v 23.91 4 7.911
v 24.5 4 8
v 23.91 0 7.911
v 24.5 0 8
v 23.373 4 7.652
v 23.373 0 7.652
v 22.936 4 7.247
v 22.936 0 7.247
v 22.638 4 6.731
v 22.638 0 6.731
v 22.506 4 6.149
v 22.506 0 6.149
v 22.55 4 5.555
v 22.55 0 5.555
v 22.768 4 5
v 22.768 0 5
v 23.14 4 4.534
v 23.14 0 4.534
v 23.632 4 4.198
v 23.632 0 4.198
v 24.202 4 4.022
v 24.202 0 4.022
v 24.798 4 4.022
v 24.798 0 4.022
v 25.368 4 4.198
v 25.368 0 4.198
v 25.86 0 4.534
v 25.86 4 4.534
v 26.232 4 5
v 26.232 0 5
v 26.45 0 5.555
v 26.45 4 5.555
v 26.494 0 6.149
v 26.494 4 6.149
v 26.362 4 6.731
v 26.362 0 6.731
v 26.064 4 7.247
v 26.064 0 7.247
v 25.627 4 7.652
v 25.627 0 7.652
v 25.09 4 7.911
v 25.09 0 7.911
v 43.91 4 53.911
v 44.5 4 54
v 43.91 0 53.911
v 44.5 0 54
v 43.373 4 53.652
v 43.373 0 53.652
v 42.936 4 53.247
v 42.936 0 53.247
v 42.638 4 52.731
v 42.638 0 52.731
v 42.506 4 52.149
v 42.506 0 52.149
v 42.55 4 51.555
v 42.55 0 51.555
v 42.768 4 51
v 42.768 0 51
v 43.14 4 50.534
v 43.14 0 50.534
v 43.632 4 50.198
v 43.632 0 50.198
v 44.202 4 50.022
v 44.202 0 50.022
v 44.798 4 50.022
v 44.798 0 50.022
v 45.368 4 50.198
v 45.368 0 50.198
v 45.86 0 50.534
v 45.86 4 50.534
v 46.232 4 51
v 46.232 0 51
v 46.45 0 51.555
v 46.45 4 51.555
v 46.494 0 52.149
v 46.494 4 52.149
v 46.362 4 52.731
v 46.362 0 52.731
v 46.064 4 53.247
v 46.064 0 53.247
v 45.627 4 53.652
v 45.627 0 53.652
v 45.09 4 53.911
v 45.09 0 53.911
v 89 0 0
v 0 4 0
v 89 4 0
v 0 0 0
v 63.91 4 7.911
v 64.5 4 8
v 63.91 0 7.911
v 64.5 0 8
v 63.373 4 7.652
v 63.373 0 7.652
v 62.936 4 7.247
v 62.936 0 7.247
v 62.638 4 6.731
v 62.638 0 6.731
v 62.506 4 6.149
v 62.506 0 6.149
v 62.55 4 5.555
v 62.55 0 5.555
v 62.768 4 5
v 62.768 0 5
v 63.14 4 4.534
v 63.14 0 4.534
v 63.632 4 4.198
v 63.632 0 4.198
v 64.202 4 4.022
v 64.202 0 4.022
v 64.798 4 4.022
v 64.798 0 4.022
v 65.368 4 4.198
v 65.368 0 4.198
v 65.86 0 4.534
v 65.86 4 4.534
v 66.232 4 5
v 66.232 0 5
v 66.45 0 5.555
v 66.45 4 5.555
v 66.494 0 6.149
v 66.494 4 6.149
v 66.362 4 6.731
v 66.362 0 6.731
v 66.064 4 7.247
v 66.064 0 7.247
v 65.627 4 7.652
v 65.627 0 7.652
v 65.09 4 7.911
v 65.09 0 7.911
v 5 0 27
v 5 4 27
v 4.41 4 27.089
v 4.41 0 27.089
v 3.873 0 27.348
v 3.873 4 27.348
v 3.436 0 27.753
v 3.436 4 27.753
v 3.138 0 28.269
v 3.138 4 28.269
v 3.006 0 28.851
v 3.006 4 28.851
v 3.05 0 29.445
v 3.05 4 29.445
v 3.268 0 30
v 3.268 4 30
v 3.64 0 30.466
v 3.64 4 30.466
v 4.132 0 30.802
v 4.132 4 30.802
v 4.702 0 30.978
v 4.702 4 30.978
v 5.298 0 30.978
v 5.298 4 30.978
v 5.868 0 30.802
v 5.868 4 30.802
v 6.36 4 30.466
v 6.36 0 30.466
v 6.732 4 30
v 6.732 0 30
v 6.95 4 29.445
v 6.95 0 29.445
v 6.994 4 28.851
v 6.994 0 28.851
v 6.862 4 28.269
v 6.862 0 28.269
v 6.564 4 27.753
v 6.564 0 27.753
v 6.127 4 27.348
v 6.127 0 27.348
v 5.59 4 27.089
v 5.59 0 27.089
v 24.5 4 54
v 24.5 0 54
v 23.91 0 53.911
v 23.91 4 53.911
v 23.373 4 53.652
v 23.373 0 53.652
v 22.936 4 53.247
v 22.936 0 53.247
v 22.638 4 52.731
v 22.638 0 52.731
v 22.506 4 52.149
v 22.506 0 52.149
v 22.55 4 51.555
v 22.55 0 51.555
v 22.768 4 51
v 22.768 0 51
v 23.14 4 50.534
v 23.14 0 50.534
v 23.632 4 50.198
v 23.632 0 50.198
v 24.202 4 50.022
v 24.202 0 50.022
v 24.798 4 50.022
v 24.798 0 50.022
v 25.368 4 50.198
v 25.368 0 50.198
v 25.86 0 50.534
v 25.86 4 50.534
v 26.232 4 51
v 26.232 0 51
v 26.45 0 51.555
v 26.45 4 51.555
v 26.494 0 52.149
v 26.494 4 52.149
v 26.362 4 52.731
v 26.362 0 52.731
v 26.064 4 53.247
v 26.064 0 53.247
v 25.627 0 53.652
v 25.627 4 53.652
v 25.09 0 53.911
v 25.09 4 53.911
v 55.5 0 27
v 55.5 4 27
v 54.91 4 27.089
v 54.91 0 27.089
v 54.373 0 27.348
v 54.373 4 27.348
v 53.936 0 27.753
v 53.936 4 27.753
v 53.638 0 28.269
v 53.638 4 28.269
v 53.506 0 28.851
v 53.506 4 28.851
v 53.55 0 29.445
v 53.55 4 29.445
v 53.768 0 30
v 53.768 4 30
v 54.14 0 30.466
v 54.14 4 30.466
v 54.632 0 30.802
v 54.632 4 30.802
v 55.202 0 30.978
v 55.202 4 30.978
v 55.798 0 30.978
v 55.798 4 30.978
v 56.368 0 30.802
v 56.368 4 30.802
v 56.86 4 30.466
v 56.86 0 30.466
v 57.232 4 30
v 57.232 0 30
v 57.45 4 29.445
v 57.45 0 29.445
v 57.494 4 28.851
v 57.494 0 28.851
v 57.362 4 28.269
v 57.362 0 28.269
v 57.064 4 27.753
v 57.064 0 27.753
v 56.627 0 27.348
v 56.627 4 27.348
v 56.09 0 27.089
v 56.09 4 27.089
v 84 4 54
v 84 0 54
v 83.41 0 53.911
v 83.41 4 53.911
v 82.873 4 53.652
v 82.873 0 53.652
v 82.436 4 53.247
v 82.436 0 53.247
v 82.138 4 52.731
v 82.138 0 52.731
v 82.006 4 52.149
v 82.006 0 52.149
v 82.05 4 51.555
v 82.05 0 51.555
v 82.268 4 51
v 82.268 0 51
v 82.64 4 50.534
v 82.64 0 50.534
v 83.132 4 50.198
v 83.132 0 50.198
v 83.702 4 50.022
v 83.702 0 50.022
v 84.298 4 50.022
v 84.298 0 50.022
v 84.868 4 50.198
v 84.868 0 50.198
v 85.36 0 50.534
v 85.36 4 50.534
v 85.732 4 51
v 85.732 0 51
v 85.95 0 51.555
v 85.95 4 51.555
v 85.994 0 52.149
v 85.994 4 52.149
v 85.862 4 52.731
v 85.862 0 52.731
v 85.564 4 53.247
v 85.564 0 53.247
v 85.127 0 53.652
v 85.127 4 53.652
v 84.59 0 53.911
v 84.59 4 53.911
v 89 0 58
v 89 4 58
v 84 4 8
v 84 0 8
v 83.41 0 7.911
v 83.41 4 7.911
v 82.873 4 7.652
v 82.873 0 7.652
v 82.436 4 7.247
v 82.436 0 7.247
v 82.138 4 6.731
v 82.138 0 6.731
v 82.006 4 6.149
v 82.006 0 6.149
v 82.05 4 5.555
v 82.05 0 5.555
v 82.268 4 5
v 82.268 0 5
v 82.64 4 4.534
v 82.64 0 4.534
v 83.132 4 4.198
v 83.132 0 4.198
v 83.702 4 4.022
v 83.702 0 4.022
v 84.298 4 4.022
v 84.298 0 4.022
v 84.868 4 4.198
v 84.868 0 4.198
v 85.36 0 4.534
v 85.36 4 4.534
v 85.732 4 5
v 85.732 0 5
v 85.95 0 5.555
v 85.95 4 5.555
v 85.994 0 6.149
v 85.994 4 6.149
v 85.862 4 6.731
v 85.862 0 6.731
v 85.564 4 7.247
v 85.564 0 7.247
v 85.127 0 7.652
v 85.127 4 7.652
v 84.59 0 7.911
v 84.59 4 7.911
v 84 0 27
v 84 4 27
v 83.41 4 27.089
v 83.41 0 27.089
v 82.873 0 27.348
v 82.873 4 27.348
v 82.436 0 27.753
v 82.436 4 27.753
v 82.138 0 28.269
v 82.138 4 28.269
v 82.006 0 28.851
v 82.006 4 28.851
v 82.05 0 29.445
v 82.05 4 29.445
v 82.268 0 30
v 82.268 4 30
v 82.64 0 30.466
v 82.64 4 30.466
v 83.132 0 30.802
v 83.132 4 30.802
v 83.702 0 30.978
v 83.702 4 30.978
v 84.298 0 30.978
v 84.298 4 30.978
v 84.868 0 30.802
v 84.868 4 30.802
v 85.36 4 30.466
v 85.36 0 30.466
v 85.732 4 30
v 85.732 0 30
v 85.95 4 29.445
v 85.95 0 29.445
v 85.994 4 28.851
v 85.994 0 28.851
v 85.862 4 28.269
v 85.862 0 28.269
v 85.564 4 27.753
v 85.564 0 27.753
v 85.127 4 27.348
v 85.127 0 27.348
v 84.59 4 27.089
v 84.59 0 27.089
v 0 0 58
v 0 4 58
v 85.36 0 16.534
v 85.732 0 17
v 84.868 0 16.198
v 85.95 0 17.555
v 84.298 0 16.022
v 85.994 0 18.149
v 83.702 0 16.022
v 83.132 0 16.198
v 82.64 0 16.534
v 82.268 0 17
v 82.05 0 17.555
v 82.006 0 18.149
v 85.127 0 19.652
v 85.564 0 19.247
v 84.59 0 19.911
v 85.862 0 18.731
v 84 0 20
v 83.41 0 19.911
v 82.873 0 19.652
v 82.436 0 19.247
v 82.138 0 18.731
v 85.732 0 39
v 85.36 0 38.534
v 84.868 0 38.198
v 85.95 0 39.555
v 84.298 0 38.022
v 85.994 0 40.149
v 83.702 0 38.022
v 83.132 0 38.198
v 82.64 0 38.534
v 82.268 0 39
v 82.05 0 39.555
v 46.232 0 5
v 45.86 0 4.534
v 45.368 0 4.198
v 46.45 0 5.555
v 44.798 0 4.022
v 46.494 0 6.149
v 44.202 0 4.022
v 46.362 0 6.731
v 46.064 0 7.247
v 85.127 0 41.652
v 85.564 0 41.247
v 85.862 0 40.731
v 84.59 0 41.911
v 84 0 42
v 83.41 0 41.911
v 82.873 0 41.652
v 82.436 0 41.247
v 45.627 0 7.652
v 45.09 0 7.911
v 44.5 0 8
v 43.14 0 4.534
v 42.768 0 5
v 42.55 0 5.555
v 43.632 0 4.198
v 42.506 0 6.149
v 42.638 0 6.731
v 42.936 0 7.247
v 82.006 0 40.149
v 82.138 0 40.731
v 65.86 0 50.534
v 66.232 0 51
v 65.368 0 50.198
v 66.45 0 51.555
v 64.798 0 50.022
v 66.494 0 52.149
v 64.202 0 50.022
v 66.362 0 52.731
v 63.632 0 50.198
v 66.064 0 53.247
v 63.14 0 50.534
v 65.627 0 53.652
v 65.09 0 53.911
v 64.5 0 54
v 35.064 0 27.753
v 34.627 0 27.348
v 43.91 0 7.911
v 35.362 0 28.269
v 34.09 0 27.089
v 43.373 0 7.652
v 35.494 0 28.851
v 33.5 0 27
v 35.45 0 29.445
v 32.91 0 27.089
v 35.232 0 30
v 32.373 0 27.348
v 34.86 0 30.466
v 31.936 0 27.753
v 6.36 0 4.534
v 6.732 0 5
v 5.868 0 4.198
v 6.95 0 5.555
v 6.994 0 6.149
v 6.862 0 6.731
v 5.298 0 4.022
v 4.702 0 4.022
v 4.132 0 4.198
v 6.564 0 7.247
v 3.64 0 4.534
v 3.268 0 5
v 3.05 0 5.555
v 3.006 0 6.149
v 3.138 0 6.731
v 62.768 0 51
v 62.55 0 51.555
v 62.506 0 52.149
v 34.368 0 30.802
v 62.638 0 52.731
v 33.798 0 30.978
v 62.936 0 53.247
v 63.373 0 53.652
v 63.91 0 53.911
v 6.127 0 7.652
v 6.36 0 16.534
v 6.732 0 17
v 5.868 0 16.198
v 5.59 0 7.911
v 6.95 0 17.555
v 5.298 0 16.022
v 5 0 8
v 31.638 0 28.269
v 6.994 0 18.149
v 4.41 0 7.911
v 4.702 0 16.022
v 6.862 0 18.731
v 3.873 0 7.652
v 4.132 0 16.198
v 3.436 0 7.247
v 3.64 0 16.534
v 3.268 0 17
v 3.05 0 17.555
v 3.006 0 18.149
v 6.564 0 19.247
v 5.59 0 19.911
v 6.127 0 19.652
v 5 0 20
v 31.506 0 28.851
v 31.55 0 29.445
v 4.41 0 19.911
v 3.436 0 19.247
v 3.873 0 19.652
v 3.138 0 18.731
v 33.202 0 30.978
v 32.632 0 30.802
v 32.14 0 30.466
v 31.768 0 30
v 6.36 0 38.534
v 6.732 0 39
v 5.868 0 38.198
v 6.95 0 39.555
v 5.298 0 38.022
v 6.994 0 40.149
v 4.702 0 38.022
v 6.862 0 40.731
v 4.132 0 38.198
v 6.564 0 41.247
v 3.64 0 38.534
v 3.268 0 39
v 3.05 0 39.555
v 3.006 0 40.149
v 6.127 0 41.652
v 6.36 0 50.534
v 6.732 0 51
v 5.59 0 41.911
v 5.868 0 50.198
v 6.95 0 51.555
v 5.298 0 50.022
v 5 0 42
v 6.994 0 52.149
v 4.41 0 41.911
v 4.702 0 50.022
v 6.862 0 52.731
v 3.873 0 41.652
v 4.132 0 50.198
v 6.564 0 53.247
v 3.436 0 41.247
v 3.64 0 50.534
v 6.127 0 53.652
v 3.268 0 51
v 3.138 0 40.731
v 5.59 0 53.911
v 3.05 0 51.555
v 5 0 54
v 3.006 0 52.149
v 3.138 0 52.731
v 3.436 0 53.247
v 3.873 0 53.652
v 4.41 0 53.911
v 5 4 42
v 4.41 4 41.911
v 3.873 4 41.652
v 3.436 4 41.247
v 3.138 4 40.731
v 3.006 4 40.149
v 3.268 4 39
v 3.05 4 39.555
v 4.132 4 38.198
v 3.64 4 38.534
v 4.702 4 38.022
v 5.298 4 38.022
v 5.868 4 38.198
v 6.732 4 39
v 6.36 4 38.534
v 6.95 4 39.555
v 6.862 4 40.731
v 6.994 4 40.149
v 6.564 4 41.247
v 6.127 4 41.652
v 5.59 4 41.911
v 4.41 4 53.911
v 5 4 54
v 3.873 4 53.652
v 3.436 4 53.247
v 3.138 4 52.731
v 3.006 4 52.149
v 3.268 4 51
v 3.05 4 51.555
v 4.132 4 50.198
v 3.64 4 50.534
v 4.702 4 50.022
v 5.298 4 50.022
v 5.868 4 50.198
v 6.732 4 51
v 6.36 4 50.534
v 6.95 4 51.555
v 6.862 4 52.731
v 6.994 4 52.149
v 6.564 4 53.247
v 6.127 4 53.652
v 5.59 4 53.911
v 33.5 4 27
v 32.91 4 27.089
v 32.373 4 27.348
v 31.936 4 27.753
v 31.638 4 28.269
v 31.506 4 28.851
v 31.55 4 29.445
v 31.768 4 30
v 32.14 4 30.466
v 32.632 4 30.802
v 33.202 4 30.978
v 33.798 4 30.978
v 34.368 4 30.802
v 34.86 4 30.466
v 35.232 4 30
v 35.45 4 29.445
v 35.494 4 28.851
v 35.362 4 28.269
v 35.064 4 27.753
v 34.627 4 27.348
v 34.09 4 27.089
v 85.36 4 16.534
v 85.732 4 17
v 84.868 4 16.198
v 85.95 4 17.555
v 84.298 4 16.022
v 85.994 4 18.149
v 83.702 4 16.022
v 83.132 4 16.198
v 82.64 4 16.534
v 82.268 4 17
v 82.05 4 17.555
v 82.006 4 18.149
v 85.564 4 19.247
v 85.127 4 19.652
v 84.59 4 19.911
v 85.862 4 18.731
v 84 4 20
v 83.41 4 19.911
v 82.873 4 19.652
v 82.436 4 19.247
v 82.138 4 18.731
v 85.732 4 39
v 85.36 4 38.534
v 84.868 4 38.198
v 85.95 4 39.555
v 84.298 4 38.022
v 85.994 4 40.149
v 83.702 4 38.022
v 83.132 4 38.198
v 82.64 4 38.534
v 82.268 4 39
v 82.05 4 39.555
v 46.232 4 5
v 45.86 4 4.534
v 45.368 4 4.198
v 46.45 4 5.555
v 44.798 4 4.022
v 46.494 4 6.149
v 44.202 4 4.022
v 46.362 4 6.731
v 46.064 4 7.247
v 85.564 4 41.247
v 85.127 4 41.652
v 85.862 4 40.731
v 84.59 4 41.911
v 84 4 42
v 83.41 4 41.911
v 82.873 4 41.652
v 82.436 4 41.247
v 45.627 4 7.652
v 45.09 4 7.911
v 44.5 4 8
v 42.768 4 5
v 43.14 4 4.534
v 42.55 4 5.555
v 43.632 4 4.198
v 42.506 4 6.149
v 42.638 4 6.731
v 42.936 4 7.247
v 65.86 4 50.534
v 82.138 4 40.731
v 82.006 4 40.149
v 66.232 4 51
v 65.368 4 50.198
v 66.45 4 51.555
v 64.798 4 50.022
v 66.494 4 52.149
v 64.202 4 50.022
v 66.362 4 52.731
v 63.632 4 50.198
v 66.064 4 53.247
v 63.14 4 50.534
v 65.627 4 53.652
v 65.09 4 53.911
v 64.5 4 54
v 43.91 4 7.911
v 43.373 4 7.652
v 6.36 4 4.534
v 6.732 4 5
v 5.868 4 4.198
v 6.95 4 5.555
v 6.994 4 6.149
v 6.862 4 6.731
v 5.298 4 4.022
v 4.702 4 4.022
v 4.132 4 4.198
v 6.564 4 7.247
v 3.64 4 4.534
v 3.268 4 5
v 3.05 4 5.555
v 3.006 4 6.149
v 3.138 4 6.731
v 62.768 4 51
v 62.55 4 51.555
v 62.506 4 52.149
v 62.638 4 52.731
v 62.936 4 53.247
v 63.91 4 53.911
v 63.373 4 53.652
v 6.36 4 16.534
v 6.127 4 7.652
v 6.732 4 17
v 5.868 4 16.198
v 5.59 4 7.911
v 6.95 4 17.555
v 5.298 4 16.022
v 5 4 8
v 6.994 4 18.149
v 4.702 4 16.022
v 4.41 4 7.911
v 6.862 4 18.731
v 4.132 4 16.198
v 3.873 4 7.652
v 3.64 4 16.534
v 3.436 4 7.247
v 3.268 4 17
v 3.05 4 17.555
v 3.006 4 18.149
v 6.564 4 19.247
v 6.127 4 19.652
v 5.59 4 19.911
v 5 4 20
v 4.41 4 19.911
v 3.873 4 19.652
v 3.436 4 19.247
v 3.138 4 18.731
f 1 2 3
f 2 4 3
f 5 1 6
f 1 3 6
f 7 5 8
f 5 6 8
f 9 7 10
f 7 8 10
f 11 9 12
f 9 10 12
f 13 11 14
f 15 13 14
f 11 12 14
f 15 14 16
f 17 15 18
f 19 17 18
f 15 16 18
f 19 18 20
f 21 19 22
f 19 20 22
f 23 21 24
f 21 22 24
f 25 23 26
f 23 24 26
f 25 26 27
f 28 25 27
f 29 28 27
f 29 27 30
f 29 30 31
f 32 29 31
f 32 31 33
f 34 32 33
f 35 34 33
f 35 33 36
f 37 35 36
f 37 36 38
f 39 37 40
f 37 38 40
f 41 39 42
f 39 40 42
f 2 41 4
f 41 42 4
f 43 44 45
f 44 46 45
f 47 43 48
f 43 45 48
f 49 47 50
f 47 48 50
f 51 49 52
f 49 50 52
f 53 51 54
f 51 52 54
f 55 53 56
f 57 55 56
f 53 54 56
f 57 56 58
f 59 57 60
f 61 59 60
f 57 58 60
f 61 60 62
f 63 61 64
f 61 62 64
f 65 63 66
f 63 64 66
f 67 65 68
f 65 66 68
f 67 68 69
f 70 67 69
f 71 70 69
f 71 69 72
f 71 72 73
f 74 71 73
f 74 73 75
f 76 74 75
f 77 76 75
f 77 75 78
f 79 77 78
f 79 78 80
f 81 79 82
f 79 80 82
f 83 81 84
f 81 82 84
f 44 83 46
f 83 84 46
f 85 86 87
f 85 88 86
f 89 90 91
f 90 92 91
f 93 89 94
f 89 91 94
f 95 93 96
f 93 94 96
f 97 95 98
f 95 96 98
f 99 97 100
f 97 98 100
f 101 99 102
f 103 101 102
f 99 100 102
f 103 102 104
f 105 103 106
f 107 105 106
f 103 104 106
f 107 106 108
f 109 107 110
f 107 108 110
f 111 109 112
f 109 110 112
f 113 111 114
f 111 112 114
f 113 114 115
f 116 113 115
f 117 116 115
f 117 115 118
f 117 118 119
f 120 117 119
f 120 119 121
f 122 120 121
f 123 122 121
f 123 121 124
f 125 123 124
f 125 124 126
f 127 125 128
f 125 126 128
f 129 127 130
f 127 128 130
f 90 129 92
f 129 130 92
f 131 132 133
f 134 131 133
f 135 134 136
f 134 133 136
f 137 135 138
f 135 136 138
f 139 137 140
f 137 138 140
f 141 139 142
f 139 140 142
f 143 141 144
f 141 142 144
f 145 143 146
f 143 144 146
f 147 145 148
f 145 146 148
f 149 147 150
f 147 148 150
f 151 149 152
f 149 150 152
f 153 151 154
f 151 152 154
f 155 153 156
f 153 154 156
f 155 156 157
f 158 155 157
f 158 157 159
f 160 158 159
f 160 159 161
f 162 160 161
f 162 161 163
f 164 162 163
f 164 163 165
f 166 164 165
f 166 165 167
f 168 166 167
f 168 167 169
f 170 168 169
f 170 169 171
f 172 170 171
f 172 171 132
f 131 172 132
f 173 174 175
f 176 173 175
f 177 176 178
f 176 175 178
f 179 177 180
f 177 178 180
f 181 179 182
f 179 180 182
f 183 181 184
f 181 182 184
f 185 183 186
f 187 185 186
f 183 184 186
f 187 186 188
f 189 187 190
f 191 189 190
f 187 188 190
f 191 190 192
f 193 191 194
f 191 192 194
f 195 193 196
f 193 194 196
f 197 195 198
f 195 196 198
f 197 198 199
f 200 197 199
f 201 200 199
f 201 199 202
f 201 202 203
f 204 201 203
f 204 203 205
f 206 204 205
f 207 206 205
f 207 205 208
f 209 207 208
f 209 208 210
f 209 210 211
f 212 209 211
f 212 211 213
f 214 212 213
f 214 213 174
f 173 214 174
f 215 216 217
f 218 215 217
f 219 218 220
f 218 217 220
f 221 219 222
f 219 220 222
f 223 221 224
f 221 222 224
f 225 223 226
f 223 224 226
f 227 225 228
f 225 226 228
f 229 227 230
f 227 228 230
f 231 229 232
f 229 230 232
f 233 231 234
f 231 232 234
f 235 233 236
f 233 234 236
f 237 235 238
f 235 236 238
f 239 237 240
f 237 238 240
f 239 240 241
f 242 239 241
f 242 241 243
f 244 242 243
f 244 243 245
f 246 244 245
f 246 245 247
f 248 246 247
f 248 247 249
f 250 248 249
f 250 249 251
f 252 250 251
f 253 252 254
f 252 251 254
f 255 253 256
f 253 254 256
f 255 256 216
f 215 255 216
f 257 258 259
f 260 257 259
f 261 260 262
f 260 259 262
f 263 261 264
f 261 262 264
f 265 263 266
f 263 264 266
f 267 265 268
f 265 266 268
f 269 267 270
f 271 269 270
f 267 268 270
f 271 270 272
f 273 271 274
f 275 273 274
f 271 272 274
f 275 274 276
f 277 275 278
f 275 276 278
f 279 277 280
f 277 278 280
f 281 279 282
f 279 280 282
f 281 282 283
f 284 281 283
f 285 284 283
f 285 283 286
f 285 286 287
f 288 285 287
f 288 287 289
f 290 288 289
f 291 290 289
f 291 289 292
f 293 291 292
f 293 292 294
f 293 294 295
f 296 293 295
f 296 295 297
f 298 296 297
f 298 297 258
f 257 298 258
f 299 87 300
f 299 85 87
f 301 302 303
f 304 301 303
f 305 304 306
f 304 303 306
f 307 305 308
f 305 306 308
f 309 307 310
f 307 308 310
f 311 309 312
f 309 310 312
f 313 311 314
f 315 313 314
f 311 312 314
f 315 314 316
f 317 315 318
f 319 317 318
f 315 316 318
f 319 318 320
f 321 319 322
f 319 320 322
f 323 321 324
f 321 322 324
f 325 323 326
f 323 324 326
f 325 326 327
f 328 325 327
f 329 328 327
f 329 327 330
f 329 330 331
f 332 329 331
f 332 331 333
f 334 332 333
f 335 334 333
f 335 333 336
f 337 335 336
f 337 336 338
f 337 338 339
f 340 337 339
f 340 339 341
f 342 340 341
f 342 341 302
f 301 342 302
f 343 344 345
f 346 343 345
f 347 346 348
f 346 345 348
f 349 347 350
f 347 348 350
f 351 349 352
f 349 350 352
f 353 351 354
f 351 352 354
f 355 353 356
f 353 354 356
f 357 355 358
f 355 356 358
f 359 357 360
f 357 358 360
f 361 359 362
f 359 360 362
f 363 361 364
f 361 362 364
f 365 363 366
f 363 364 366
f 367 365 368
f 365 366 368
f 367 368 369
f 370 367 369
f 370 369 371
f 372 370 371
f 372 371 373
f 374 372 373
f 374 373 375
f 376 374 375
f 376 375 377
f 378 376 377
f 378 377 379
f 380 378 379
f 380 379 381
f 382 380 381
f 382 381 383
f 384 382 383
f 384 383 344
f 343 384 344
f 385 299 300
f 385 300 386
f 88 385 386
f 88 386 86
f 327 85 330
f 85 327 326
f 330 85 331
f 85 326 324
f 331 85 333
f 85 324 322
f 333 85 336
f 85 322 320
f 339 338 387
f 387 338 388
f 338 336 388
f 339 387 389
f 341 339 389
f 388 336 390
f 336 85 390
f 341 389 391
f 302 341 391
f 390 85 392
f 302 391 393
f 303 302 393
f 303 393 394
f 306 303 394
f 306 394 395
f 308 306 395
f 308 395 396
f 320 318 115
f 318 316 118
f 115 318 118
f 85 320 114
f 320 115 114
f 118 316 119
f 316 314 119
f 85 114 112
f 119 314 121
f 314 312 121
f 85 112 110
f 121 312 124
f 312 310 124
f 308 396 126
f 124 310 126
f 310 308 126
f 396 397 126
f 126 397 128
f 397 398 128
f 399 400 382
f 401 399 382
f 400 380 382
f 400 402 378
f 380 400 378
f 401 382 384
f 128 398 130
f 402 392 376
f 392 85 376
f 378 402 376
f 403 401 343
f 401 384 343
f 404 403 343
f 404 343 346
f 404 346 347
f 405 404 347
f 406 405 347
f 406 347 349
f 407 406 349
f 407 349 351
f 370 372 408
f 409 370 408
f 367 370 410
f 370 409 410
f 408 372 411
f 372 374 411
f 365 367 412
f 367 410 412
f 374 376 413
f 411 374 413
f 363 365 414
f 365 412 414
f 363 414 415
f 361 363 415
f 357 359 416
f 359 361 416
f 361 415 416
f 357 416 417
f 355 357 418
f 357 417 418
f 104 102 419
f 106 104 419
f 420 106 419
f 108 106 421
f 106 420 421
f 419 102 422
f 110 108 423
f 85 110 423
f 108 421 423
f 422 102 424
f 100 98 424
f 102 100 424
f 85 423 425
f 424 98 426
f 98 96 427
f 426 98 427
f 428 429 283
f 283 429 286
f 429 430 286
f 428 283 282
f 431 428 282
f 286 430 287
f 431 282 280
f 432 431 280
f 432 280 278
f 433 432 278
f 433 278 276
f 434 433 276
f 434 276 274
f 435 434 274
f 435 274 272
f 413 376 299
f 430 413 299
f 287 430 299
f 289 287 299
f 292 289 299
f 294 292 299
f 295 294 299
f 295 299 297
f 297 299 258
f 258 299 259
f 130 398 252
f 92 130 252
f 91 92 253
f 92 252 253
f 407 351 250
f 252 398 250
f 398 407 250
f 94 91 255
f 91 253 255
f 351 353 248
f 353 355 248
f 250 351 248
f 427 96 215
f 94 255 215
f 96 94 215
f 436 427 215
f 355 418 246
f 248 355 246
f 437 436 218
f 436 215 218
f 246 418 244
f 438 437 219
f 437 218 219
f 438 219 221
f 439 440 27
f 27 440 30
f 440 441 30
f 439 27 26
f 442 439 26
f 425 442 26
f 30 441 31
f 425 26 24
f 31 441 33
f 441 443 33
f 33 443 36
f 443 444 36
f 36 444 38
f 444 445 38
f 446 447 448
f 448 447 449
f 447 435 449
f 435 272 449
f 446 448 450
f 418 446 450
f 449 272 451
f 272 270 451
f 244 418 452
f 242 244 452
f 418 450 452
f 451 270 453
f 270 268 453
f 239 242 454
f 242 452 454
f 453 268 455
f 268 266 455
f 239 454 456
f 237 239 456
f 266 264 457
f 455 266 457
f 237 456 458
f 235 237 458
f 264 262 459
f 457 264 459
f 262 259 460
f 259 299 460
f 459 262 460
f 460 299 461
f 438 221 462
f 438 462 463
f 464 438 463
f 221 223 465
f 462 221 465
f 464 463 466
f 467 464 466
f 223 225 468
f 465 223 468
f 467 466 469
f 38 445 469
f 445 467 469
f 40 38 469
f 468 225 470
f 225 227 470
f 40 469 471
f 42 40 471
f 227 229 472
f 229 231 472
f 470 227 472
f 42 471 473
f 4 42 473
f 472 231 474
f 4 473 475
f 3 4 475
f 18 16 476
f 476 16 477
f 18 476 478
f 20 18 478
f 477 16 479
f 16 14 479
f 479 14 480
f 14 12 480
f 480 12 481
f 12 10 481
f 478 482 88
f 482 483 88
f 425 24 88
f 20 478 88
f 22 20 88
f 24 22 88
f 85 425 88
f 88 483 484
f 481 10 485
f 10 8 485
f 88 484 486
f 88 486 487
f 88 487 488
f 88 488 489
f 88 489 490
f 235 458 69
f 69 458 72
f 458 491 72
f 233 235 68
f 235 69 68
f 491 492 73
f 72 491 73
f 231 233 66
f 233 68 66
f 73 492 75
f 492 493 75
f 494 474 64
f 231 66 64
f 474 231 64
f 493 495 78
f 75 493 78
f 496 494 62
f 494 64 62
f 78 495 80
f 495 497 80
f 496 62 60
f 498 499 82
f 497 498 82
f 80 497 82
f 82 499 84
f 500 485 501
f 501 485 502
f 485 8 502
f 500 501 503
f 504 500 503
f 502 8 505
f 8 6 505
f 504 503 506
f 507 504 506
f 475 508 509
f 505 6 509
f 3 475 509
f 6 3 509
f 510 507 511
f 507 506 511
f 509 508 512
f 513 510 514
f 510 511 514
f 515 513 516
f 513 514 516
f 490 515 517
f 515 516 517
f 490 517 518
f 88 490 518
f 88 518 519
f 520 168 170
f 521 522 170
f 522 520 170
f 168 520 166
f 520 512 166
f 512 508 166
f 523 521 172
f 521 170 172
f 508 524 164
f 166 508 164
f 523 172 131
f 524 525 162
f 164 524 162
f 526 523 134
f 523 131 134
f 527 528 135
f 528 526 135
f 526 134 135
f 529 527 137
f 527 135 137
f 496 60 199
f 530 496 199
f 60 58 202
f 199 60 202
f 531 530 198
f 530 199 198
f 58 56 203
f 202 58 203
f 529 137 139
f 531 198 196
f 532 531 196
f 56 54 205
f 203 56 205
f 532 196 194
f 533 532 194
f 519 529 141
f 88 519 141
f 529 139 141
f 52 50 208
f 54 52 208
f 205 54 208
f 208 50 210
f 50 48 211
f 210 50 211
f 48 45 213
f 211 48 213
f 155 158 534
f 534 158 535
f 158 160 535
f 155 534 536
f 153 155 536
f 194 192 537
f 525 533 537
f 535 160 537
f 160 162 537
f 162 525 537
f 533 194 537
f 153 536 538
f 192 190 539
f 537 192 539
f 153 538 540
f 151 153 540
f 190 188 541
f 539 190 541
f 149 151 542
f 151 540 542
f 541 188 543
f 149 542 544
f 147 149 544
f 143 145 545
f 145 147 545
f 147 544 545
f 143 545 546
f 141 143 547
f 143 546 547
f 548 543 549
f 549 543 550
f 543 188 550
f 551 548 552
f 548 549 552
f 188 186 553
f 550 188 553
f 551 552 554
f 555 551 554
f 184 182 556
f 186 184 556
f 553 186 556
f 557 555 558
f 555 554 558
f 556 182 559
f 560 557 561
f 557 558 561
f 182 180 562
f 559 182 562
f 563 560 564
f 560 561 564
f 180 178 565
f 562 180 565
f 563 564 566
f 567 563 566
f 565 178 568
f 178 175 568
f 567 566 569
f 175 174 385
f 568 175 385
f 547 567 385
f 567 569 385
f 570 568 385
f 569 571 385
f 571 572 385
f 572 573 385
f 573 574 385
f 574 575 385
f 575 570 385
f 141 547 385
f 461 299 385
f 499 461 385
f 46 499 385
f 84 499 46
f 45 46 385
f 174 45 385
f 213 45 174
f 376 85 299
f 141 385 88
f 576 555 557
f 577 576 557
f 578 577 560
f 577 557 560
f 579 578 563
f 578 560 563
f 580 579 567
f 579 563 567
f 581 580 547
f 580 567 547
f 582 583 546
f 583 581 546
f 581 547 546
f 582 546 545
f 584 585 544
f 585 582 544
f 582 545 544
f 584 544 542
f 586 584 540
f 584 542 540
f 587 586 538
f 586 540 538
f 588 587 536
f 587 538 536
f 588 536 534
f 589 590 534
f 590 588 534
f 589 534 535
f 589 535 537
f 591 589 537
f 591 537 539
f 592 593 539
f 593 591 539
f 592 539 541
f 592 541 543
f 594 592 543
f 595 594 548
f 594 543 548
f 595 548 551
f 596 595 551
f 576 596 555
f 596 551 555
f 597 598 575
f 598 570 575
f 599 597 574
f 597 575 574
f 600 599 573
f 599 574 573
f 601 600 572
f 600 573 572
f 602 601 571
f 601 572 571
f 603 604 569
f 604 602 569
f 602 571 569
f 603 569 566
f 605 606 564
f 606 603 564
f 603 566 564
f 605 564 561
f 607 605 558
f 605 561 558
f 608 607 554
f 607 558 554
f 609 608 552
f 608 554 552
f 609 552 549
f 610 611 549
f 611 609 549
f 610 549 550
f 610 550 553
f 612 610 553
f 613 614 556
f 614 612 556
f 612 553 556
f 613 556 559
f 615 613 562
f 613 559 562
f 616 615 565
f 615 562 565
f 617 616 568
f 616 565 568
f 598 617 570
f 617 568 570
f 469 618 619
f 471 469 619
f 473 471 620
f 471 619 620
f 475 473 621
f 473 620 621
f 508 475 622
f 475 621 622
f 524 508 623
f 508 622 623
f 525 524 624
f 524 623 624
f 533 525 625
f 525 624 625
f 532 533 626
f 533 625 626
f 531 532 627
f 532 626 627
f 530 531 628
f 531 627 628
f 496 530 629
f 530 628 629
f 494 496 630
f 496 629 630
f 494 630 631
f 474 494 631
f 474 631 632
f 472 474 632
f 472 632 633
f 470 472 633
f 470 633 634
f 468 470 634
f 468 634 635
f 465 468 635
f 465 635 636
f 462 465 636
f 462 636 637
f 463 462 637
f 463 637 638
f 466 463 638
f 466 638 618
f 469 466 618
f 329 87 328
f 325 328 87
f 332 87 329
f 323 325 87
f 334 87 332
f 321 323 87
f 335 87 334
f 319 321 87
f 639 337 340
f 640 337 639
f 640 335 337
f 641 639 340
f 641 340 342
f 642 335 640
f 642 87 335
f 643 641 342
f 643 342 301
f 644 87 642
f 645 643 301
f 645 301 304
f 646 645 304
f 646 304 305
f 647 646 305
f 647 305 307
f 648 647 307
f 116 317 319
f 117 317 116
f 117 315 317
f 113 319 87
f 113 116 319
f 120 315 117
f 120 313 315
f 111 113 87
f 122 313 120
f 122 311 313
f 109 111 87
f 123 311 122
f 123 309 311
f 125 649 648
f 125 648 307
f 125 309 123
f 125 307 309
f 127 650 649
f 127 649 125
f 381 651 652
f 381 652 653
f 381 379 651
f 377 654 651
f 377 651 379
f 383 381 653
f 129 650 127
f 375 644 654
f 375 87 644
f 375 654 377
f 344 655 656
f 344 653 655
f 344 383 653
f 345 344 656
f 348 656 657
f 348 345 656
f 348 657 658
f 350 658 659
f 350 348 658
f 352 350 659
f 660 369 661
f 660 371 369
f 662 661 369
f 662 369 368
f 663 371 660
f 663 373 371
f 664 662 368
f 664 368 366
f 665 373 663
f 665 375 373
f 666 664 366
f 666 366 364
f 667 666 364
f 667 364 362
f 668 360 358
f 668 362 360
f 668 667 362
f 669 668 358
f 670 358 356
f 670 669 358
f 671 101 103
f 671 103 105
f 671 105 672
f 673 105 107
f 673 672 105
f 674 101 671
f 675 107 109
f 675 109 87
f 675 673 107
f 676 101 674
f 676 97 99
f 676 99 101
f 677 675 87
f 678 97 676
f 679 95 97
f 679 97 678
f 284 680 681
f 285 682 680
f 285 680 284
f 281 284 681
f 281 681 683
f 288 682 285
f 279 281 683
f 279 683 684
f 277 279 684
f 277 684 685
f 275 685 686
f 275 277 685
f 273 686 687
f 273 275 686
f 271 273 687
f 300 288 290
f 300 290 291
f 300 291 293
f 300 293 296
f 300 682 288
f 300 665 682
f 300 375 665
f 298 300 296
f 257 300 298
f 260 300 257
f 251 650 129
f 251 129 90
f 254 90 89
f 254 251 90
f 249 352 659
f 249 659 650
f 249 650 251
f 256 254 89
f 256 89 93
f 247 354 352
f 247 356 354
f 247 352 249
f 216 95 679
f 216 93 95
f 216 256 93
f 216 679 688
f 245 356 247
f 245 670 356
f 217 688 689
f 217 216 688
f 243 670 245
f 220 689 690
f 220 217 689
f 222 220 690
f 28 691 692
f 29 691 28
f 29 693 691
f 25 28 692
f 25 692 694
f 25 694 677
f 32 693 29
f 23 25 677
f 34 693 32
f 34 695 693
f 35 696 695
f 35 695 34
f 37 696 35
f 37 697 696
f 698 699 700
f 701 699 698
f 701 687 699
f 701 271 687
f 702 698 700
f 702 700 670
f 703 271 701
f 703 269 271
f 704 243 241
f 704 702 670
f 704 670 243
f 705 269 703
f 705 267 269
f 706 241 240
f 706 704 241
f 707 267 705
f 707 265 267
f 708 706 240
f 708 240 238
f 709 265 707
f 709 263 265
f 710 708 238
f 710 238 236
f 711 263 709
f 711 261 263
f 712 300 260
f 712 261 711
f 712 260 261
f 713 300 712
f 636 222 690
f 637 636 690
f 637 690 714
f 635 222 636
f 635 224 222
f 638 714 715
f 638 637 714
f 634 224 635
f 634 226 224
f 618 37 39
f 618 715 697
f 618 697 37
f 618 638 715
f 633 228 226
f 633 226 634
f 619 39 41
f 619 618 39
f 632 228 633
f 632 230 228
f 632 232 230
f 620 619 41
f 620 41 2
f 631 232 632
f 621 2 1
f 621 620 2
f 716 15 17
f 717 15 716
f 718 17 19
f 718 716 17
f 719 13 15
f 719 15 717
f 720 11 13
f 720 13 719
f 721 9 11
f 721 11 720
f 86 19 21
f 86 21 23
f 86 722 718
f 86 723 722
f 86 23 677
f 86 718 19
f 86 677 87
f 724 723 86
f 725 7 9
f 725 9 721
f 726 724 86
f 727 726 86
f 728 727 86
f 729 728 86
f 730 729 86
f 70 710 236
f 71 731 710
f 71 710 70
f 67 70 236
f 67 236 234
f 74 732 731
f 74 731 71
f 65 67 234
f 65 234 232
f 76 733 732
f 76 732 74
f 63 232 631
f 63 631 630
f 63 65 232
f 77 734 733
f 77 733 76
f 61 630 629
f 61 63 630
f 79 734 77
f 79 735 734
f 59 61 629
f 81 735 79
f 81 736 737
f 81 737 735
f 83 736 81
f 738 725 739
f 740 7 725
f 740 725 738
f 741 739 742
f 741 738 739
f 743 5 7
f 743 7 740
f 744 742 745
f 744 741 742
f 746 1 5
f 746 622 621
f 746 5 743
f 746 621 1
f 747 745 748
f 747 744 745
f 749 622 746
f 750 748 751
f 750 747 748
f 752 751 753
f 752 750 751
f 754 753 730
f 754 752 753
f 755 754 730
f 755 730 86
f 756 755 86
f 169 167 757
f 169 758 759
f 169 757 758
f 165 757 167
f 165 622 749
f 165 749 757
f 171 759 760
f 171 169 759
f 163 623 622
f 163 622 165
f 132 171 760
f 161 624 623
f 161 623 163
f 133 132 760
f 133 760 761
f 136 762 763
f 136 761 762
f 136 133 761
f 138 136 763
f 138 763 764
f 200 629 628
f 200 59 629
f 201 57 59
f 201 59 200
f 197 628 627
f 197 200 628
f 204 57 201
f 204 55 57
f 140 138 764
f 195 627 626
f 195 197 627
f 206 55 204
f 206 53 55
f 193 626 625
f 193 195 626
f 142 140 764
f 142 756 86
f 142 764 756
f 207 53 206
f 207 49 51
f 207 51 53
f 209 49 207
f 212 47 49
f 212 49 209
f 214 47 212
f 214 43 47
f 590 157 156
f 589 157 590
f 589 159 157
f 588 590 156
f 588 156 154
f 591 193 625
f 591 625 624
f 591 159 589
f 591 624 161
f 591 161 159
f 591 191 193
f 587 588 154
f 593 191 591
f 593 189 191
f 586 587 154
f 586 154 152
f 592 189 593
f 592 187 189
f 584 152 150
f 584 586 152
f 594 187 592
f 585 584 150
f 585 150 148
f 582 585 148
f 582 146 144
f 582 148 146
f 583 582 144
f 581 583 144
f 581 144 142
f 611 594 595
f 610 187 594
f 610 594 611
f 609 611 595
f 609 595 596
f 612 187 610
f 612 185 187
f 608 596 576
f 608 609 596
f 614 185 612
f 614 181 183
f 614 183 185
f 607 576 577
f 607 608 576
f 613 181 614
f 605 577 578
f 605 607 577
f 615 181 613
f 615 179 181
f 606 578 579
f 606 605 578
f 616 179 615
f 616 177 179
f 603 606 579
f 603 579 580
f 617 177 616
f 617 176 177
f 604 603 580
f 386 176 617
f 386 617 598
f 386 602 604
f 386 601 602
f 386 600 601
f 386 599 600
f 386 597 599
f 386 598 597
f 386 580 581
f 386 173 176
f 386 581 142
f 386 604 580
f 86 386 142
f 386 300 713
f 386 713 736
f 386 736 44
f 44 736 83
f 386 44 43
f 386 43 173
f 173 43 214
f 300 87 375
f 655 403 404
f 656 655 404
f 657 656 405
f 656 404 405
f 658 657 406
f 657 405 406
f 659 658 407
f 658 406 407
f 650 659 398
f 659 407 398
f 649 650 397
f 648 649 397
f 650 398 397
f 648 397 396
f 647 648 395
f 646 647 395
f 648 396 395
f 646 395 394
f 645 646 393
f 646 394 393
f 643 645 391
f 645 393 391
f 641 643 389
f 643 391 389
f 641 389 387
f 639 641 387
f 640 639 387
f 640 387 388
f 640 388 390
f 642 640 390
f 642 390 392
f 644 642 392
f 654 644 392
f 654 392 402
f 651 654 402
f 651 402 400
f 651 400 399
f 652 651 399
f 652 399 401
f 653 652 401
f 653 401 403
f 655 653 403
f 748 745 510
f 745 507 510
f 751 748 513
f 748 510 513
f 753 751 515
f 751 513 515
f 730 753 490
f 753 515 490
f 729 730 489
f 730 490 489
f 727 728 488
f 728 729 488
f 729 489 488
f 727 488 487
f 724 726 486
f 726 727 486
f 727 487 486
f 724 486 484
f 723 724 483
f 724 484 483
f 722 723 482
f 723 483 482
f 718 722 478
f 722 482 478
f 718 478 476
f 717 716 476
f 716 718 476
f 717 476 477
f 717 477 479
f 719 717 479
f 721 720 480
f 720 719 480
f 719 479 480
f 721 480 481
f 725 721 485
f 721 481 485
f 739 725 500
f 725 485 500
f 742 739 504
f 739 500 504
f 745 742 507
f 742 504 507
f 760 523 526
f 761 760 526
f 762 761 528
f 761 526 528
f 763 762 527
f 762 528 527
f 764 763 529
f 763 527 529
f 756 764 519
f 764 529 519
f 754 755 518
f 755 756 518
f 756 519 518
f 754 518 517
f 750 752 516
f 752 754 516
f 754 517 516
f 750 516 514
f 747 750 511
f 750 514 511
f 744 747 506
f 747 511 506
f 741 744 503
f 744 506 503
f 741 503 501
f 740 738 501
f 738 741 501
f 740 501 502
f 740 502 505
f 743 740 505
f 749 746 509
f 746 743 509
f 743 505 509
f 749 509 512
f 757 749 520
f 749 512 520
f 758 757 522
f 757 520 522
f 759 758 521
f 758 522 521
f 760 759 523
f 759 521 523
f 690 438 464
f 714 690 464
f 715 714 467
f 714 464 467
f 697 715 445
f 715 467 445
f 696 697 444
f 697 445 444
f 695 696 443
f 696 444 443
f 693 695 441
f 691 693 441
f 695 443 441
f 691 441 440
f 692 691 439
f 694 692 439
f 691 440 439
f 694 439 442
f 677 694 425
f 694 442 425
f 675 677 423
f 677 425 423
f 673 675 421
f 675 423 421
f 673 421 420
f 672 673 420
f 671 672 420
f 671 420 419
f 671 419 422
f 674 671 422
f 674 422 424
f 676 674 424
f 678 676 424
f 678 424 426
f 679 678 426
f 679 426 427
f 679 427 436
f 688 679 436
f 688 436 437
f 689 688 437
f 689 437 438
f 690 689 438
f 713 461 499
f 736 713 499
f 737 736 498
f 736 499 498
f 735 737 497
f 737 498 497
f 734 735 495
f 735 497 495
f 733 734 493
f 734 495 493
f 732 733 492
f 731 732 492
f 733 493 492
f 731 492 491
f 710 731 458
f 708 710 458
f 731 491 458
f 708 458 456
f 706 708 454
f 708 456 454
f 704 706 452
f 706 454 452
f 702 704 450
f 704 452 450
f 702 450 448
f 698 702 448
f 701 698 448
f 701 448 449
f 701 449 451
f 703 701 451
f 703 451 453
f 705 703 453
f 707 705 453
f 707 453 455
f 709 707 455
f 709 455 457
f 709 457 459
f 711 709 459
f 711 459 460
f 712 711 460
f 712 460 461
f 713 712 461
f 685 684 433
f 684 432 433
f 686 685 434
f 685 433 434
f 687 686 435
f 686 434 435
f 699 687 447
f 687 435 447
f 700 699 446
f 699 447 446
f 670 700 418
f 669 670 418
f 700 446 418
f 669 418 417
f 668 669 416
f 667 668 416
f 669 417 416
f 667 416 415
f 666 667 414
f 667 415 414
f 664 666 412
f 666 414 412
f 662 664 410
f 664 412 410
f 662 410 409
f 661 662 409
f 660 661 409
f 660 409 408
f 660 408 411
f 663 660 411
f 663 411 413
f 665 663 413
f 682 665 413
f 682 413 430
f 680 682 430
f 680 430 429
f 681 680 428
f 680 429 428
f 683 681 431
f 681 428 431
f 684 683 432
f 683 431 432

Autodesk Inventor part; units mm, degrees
ref_plane "XZ Plane" through (0, 0, 0) normal (0, 1, 0) x (-1, 0, 0)
ref_plane "XY Plane" through (0, 0, 0) normal (0, 0, 1) x (1, 0, 0)
sketch "Skizze1" plane through (0, 0, 0) normal (0, 1, 0) x (-1, 0, 0)
  line L0 (0, 0) -> (-89, 0)
  line L1 (-89, 0) -> (-89, 58)
  line L2 (-89, 58) -> (0, 58)
  line L3 (0, 58) -> (0, 0)
  dimension "d0" = 58
  dimension "d1" = 89
extrude "Extrusion1" add sketch "Skizze1" along normal blind 4
sketch "Skizze2" plane through (0, 4, 0) normal (0, 1, 0) x (1, 0, 0)
  line L0 (89, 0) -> (0, 0) projected
  line L1 (89, -58) -> (89, 0) projected
  line L2 (0, 0) -> (0, -58) projected
  line L3 (0, -58) -> (89, -58) projected
  point P0 (84, -6)
  point P1 (84, -52)
  point P2 (84, -40)
  point P3 (84, -18)
  point P4 (89, -29)
  point P5 (89, -29)
  dimension "d5" = 5
  dimension "d12" = 6
  dimension "d13" = 6
  dimension "d17" = 11
  dimension "d18" = 11
hole "Bohrung1" at (84, 4, 6) at (84, 4, 52) at (84, 4, 40) at (84, 4, 18) direction (0, -1, 0) diameter 4 depth 4
ref_plane "Arbeitsebene1" through (44.5, 0, 0) normal (1, 0, 0) x (0, 1, 0)
mirror "Spiegeln1" about plane through (44.5, 0, 0) normal (1, 0, 0) of "Bohrung1"
sketch "Skizze3" plane through (0, 4, 0) normal (0, 1, 0) x (1, 0, 0)
  line L0 (0, -58) -> (89, -58) projected
  circle A0 centre (84, -6) radius 2 projected
  line L1 (89, 0) -> (0, 0) projected
  point P0 (64.5, -6)
  point P1 (24.5, -6)
  point P2 (44.5, -6)
  point P3 (44.5, -58)
  point P4 (64.5, -52)
  point P5 (44.5, -52)
  point P6 (24.5, -52)
  dimension "d27" = 20
  dimension "d28" = 20
  dimension "d44" = 6
  dimension "d45" = 6
hole "Bohrung2" at (64.5, 4, 6) at (24.5, 4, 6) at (44.5, 4, 6) at (64.5, 4, 52) at (44.5, 4, 52) at (24.5, 4, 52) direction (0, -1, 0) diameter 4 depth 4
sketch "Skizze4" plane through (0, 0, 0) normal (0, -1, 0) x (1, 0, 0)
  line L0 (0, 0) -> (0, 58) projected
  circle A0 centre (5, 52) radius 2 projected
  circle A1 centre (84, 52) radius 2 projected
  point P0 (5, 29)
  point P1 (84, 29)
  point P2 (0, 29)
hole "Bohrung3" at (5, 0, 29) at (84, 0, 29) direction (0, 1, 0) diameter 4 end through all
sketch "Sketch9" plane through (0, 0, 0) normal (0, -1, 0) x (1, 0, 0)
  line L0 (0, 0) -> (0, 58) projected
  line L1 (0, 58) -> (89, 58) projected
  point P0 (33.5, 29)
  point P1 (55.5, 29)
  point P2 (0, 29)
  point P3 (44.5, 58)
  dimension "d67" = 22
  dimension "d68" = 11
hole "Hole4" at (55.5, 0, 29) at (33.5, 0, 29) direction (0, 1, 0) diameter 4 depth 4
properties part number "1152" material "Kupfer"
